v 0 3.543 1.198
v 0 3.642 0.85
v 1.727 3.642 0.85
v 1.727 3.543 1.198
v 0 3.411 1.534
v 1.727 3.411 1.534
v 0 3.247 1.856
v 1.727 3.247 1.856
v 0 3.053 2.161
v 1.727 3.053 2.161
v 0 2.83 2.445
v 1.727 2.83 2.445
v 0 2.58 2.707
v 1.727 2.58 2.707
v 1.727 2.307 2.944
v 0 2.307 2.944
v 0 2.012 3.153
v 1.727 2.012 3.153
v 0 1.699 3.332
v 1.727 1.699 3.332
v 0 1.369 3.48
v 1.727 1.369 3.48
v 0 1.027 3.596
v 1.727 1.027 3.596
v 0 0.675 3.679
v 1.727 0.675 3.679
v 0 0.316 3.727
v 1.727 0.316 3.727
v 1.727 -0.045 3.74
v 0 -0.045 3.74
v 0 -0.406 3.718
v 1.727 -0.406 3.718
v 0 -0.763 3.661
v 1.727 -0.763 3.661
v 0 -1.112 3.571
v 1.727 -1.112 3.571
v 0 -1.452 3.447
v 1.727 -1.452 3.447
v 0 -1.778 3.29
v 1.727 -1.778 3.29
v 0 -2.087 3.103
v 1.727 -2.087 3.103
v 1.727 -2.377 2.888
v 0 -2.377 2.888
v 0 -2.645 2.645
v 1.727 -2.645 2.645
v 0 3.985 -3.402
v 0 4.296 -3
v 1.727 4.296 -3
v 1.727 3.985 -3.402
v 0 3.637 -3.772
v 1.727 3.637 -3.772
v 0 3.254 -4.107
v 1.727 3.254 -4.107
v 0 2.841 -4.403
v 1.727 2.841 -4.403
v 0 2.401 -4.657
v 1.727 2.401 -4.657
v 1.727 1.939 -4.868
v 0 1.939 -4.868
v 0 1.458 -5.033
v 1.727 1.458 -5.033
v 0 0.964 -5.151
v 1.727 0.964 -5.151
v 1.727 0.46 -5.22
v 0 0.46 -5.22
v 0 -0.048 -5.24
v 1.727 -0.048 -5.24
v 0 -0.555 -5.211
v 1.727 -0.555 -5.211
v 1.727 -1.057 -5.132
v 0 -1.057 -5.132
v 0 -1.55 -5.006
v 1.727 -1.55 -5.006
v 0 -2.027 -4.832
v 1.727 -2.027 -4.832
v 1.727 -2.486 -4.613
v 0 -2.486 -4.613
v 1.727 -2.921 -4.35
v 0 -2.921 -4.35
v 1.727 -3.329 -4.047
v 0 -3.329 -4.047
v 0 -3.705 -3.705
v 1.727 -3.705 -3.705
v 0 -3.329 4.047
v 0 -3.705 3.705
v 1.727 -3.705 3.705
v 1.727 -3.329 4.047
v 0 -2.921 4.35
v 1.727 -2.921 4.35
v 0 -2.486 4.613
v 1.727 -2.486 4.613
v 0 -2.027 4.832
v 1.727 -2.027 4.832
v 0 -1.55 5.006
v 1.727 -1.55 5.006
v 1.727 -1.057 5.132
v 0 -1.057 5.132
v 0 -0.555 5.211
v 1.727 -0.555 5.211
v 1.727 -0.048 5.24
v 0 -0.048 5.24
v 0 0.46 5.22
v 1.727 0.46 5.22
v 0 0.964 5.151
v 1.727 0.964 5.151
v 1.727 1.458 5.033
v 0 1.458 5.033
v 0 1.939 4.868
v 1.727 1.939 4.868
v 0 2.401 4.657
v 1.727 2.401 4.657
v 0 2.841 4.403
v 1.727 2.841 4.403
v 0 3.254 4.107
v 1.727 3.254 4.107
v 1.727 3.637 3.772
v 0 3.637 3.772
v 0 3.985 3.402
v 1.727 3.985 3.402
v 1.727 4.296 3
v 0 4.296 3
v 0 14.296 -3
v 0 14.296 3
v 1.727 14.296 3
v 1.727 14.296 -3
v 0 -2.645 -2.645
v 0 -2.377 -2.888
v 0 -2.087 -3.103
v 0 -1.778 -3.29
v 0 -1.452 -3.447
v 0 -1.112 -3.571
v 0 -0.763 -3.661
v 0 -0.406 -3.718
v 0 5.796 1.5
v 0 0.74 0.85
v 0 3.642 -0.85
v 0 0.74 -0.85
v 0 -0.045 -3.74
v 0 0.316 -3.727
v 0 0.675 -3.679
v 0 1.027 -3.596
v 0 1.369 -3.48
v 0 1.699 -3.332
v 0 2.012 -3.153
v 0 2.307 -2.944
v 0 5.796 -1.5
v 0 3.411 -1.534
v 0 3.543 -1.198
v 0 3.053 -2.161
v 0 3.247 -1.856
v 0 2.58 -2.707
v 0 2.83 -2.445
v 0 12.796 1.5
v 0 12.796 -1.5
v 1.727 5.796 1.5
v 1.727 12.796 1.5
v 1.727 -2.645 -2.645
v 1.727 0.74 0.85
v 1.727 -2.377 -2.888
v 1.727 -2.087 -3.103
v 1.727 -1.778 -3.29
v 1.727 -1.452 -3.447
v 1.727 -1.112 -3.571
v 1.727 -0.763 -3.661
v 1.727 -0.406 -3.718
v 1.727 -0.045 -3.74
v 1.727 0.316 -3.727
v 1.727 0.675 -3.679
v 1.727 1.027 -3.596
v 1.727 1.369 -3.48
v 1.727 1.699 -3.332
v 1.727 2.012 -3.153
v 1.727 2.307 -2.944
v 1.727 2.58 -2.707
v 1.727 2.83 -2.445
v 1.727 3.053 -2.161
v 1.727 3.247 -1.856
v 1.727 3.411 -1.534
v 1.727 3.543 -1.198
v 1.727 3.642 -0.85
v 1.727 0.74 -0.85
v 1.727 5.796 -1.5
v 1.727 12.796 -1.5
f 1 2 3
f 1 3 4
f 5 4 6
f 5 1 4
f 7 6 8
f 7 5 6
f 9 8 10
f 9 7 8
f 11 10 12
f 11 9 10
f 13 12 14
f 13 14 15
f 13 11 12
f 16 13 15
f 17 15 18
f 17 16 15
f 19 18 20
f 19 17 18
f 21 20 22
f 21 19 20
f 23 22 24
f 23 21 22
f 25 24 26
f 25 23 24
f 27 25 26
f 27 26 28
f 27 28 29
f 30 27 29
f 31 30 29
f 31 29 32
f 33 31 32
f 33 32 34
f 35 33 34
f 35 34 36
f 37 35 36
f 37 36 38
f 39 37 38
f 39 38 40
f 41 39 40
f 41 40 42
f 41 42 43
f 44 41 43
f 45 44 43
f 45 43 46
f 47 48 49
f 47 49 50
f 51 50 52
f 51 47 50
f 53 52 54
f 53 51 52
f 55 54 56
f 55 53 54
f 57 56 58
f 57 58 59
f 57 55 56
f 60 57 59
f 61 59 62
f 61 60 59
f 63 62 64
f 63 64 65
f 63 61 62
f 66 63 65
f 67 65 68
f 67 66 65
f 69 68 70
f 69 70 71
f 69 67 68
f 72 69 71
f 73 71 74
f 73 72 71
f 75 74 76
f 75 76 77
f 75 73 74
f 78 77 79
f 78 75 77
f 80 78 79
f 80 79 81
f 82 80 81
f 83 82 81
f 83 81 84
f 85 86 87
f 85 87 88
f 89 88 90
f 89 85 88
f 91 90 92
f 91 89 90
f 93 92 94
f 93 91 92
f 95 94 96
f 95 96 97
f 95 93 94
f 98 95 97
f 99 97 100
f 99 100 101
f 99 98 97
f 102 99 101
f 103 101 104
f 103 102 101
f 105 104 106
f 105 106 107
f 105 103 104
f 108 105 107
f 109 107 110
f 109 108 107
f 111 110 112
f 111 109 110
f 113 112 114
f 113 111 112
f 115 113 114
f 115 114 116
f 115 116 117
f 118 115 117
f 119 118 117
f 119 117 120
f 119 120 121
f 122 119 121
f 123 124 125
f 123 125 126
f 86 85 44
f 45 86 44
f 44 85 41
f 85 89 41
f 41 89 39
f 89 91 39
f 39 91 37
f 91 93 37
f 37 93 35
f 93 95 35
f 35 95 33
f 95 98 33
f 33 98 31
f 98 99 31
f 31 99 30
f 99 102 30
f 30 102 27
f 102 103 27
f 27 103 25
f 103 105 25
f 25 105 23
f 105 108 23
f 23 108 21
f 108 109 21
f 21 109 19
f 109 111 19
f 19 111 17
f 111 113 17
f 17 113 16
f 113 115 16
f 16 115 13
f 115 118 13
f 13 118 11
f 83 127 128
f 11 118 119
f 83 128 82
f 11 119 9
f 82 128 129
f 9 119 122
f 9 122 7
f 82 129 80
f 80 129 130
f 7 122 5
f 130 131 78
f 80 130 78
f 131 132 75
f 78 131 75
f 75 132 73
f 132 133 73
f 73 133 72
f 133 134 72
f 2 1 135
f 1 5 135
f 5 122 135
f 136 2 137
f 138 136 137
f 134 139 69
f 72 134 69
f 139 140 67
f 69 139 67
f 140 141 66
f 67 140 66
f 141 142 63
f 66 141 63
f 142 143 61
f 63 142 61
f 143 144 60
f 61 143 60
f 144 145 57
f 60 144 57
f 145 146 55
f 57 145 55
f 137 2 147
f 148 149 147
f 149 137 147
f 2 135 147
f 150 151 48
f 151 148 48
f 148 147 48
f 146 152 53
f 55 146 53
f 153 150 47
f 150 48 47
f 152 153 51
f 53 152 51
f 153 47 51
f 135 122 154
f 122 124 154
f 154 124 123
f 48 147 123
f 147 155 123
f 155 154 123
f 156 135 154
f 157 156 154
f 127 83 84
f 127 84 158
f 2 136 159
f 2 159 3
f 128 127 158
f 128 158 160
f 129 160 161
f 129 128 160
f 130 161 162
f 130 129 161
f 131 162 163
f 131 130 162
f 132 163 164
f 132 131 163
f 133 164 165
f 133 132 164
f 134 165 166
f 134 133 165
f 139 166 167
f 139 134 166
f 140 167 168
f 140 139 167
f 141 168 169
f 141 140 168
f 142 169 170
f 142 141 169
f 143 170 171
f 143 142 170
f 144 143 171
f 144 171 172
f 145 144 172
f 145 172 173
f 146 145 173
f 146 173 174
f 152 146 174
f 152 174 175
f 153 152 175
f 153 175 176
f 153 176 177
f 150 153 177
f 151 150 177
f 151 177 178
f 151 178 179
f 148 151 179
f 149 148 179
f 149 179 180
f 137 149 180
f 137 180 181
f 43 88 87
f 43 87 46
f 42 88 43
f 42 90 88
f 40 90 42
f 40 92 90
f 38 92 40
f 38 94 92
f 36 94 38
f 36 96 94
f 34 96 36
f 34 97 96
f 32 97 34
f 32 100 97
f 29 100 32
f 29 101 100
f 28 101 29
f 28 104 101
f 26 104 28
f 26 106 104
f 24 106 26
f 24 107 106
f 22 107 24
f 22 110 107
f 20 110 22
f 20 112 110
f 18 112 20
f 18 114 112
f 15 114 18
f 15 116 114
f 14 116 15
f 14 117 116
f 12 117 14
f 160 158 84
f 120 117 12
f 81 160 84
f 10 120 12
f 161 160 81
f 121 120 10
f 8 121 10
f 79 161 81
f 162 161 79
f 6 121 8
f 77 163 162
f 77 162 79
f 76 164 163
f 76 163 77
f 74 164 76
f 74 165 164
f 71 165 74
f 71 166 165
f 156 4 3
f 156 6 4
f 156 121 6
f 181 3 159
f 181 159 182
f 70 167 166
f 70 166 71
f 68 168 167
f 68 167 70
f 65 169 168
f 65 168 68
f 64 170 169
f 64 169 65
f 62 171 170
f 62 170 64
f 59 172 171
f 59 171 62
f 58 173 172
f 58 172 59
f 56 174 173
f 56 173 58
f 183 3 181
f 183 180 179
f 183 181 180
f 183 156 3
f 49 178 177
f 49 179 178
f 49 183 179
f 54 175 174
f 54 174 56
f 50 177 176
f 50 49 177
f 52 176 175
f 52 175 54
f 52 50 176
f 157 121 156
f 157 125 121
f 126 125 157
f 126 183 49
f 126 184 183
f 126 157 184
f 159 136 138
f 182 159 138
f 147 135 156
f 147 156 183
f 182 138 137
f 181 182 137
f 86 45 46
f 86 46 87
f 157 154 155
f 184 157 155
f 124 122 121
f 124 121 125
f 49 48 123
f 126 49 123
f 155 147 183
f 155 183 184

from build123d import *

# Parameters (mm, degrees)
SKETCH1_W           = 3
SKETCH1_H           = 7
BOSS_EXTRUDE1_DEPTH = 1.7272


with BuildPart() as part:
    # Sketch1 → Boss-Extrude1 (new body)
    with BuildSketch(Plane(origin=(0, 0, 0), x_dir=(0, 0, -1), z_dir=(1, 0, 0))):
        with BuildLine():
            Line((-3.705239533, -3.705239533), (-2.644579362, -2.644579362))
            ThreePointArc((-2.644579362, -2.644579362), (-3.596344694, 1.026598676), (-0.85, 3.642128499))
            Line((-0.85, 3.642128499), (-0.85, 0.74))
            Line((-0.85, 0.74), (0.85, 0.74))
            Line((0.85, 0.74), (0.85, 3.642128499))
            ThreePointArc((0.85, 3.642128499), (3.596344694, 1.026598676), (2.644579362, -2.644579362))
            Line((2.644579362, -2.644579362), (3.705239533, -3.705239533))
            ThreePointArc((3.705239533, -3.705239533), (5.219764516, 0.460063475), (3, 4.296230906))
            Line((3, 4.296230906), (3, 14.296230906))
            Line((3, 14.296230906), (-3, 14.296230906))
            Line((-3, 14.296230906), (-3, 4.296230906))
            ThreePointArc((-3, 4.296230906), (-5.219764516, 0.460063475), (-3.705239533, -3.705239533))
        make_face()
        with Locations((0, 9.296230906)):
            Rectangle(SKETCH1_W, SKETCH1_H, mode=Mode.SUBTRACT)
    extrude(amount=BOSS_EXTRUDE1_DEPTH)


solid = part.part
